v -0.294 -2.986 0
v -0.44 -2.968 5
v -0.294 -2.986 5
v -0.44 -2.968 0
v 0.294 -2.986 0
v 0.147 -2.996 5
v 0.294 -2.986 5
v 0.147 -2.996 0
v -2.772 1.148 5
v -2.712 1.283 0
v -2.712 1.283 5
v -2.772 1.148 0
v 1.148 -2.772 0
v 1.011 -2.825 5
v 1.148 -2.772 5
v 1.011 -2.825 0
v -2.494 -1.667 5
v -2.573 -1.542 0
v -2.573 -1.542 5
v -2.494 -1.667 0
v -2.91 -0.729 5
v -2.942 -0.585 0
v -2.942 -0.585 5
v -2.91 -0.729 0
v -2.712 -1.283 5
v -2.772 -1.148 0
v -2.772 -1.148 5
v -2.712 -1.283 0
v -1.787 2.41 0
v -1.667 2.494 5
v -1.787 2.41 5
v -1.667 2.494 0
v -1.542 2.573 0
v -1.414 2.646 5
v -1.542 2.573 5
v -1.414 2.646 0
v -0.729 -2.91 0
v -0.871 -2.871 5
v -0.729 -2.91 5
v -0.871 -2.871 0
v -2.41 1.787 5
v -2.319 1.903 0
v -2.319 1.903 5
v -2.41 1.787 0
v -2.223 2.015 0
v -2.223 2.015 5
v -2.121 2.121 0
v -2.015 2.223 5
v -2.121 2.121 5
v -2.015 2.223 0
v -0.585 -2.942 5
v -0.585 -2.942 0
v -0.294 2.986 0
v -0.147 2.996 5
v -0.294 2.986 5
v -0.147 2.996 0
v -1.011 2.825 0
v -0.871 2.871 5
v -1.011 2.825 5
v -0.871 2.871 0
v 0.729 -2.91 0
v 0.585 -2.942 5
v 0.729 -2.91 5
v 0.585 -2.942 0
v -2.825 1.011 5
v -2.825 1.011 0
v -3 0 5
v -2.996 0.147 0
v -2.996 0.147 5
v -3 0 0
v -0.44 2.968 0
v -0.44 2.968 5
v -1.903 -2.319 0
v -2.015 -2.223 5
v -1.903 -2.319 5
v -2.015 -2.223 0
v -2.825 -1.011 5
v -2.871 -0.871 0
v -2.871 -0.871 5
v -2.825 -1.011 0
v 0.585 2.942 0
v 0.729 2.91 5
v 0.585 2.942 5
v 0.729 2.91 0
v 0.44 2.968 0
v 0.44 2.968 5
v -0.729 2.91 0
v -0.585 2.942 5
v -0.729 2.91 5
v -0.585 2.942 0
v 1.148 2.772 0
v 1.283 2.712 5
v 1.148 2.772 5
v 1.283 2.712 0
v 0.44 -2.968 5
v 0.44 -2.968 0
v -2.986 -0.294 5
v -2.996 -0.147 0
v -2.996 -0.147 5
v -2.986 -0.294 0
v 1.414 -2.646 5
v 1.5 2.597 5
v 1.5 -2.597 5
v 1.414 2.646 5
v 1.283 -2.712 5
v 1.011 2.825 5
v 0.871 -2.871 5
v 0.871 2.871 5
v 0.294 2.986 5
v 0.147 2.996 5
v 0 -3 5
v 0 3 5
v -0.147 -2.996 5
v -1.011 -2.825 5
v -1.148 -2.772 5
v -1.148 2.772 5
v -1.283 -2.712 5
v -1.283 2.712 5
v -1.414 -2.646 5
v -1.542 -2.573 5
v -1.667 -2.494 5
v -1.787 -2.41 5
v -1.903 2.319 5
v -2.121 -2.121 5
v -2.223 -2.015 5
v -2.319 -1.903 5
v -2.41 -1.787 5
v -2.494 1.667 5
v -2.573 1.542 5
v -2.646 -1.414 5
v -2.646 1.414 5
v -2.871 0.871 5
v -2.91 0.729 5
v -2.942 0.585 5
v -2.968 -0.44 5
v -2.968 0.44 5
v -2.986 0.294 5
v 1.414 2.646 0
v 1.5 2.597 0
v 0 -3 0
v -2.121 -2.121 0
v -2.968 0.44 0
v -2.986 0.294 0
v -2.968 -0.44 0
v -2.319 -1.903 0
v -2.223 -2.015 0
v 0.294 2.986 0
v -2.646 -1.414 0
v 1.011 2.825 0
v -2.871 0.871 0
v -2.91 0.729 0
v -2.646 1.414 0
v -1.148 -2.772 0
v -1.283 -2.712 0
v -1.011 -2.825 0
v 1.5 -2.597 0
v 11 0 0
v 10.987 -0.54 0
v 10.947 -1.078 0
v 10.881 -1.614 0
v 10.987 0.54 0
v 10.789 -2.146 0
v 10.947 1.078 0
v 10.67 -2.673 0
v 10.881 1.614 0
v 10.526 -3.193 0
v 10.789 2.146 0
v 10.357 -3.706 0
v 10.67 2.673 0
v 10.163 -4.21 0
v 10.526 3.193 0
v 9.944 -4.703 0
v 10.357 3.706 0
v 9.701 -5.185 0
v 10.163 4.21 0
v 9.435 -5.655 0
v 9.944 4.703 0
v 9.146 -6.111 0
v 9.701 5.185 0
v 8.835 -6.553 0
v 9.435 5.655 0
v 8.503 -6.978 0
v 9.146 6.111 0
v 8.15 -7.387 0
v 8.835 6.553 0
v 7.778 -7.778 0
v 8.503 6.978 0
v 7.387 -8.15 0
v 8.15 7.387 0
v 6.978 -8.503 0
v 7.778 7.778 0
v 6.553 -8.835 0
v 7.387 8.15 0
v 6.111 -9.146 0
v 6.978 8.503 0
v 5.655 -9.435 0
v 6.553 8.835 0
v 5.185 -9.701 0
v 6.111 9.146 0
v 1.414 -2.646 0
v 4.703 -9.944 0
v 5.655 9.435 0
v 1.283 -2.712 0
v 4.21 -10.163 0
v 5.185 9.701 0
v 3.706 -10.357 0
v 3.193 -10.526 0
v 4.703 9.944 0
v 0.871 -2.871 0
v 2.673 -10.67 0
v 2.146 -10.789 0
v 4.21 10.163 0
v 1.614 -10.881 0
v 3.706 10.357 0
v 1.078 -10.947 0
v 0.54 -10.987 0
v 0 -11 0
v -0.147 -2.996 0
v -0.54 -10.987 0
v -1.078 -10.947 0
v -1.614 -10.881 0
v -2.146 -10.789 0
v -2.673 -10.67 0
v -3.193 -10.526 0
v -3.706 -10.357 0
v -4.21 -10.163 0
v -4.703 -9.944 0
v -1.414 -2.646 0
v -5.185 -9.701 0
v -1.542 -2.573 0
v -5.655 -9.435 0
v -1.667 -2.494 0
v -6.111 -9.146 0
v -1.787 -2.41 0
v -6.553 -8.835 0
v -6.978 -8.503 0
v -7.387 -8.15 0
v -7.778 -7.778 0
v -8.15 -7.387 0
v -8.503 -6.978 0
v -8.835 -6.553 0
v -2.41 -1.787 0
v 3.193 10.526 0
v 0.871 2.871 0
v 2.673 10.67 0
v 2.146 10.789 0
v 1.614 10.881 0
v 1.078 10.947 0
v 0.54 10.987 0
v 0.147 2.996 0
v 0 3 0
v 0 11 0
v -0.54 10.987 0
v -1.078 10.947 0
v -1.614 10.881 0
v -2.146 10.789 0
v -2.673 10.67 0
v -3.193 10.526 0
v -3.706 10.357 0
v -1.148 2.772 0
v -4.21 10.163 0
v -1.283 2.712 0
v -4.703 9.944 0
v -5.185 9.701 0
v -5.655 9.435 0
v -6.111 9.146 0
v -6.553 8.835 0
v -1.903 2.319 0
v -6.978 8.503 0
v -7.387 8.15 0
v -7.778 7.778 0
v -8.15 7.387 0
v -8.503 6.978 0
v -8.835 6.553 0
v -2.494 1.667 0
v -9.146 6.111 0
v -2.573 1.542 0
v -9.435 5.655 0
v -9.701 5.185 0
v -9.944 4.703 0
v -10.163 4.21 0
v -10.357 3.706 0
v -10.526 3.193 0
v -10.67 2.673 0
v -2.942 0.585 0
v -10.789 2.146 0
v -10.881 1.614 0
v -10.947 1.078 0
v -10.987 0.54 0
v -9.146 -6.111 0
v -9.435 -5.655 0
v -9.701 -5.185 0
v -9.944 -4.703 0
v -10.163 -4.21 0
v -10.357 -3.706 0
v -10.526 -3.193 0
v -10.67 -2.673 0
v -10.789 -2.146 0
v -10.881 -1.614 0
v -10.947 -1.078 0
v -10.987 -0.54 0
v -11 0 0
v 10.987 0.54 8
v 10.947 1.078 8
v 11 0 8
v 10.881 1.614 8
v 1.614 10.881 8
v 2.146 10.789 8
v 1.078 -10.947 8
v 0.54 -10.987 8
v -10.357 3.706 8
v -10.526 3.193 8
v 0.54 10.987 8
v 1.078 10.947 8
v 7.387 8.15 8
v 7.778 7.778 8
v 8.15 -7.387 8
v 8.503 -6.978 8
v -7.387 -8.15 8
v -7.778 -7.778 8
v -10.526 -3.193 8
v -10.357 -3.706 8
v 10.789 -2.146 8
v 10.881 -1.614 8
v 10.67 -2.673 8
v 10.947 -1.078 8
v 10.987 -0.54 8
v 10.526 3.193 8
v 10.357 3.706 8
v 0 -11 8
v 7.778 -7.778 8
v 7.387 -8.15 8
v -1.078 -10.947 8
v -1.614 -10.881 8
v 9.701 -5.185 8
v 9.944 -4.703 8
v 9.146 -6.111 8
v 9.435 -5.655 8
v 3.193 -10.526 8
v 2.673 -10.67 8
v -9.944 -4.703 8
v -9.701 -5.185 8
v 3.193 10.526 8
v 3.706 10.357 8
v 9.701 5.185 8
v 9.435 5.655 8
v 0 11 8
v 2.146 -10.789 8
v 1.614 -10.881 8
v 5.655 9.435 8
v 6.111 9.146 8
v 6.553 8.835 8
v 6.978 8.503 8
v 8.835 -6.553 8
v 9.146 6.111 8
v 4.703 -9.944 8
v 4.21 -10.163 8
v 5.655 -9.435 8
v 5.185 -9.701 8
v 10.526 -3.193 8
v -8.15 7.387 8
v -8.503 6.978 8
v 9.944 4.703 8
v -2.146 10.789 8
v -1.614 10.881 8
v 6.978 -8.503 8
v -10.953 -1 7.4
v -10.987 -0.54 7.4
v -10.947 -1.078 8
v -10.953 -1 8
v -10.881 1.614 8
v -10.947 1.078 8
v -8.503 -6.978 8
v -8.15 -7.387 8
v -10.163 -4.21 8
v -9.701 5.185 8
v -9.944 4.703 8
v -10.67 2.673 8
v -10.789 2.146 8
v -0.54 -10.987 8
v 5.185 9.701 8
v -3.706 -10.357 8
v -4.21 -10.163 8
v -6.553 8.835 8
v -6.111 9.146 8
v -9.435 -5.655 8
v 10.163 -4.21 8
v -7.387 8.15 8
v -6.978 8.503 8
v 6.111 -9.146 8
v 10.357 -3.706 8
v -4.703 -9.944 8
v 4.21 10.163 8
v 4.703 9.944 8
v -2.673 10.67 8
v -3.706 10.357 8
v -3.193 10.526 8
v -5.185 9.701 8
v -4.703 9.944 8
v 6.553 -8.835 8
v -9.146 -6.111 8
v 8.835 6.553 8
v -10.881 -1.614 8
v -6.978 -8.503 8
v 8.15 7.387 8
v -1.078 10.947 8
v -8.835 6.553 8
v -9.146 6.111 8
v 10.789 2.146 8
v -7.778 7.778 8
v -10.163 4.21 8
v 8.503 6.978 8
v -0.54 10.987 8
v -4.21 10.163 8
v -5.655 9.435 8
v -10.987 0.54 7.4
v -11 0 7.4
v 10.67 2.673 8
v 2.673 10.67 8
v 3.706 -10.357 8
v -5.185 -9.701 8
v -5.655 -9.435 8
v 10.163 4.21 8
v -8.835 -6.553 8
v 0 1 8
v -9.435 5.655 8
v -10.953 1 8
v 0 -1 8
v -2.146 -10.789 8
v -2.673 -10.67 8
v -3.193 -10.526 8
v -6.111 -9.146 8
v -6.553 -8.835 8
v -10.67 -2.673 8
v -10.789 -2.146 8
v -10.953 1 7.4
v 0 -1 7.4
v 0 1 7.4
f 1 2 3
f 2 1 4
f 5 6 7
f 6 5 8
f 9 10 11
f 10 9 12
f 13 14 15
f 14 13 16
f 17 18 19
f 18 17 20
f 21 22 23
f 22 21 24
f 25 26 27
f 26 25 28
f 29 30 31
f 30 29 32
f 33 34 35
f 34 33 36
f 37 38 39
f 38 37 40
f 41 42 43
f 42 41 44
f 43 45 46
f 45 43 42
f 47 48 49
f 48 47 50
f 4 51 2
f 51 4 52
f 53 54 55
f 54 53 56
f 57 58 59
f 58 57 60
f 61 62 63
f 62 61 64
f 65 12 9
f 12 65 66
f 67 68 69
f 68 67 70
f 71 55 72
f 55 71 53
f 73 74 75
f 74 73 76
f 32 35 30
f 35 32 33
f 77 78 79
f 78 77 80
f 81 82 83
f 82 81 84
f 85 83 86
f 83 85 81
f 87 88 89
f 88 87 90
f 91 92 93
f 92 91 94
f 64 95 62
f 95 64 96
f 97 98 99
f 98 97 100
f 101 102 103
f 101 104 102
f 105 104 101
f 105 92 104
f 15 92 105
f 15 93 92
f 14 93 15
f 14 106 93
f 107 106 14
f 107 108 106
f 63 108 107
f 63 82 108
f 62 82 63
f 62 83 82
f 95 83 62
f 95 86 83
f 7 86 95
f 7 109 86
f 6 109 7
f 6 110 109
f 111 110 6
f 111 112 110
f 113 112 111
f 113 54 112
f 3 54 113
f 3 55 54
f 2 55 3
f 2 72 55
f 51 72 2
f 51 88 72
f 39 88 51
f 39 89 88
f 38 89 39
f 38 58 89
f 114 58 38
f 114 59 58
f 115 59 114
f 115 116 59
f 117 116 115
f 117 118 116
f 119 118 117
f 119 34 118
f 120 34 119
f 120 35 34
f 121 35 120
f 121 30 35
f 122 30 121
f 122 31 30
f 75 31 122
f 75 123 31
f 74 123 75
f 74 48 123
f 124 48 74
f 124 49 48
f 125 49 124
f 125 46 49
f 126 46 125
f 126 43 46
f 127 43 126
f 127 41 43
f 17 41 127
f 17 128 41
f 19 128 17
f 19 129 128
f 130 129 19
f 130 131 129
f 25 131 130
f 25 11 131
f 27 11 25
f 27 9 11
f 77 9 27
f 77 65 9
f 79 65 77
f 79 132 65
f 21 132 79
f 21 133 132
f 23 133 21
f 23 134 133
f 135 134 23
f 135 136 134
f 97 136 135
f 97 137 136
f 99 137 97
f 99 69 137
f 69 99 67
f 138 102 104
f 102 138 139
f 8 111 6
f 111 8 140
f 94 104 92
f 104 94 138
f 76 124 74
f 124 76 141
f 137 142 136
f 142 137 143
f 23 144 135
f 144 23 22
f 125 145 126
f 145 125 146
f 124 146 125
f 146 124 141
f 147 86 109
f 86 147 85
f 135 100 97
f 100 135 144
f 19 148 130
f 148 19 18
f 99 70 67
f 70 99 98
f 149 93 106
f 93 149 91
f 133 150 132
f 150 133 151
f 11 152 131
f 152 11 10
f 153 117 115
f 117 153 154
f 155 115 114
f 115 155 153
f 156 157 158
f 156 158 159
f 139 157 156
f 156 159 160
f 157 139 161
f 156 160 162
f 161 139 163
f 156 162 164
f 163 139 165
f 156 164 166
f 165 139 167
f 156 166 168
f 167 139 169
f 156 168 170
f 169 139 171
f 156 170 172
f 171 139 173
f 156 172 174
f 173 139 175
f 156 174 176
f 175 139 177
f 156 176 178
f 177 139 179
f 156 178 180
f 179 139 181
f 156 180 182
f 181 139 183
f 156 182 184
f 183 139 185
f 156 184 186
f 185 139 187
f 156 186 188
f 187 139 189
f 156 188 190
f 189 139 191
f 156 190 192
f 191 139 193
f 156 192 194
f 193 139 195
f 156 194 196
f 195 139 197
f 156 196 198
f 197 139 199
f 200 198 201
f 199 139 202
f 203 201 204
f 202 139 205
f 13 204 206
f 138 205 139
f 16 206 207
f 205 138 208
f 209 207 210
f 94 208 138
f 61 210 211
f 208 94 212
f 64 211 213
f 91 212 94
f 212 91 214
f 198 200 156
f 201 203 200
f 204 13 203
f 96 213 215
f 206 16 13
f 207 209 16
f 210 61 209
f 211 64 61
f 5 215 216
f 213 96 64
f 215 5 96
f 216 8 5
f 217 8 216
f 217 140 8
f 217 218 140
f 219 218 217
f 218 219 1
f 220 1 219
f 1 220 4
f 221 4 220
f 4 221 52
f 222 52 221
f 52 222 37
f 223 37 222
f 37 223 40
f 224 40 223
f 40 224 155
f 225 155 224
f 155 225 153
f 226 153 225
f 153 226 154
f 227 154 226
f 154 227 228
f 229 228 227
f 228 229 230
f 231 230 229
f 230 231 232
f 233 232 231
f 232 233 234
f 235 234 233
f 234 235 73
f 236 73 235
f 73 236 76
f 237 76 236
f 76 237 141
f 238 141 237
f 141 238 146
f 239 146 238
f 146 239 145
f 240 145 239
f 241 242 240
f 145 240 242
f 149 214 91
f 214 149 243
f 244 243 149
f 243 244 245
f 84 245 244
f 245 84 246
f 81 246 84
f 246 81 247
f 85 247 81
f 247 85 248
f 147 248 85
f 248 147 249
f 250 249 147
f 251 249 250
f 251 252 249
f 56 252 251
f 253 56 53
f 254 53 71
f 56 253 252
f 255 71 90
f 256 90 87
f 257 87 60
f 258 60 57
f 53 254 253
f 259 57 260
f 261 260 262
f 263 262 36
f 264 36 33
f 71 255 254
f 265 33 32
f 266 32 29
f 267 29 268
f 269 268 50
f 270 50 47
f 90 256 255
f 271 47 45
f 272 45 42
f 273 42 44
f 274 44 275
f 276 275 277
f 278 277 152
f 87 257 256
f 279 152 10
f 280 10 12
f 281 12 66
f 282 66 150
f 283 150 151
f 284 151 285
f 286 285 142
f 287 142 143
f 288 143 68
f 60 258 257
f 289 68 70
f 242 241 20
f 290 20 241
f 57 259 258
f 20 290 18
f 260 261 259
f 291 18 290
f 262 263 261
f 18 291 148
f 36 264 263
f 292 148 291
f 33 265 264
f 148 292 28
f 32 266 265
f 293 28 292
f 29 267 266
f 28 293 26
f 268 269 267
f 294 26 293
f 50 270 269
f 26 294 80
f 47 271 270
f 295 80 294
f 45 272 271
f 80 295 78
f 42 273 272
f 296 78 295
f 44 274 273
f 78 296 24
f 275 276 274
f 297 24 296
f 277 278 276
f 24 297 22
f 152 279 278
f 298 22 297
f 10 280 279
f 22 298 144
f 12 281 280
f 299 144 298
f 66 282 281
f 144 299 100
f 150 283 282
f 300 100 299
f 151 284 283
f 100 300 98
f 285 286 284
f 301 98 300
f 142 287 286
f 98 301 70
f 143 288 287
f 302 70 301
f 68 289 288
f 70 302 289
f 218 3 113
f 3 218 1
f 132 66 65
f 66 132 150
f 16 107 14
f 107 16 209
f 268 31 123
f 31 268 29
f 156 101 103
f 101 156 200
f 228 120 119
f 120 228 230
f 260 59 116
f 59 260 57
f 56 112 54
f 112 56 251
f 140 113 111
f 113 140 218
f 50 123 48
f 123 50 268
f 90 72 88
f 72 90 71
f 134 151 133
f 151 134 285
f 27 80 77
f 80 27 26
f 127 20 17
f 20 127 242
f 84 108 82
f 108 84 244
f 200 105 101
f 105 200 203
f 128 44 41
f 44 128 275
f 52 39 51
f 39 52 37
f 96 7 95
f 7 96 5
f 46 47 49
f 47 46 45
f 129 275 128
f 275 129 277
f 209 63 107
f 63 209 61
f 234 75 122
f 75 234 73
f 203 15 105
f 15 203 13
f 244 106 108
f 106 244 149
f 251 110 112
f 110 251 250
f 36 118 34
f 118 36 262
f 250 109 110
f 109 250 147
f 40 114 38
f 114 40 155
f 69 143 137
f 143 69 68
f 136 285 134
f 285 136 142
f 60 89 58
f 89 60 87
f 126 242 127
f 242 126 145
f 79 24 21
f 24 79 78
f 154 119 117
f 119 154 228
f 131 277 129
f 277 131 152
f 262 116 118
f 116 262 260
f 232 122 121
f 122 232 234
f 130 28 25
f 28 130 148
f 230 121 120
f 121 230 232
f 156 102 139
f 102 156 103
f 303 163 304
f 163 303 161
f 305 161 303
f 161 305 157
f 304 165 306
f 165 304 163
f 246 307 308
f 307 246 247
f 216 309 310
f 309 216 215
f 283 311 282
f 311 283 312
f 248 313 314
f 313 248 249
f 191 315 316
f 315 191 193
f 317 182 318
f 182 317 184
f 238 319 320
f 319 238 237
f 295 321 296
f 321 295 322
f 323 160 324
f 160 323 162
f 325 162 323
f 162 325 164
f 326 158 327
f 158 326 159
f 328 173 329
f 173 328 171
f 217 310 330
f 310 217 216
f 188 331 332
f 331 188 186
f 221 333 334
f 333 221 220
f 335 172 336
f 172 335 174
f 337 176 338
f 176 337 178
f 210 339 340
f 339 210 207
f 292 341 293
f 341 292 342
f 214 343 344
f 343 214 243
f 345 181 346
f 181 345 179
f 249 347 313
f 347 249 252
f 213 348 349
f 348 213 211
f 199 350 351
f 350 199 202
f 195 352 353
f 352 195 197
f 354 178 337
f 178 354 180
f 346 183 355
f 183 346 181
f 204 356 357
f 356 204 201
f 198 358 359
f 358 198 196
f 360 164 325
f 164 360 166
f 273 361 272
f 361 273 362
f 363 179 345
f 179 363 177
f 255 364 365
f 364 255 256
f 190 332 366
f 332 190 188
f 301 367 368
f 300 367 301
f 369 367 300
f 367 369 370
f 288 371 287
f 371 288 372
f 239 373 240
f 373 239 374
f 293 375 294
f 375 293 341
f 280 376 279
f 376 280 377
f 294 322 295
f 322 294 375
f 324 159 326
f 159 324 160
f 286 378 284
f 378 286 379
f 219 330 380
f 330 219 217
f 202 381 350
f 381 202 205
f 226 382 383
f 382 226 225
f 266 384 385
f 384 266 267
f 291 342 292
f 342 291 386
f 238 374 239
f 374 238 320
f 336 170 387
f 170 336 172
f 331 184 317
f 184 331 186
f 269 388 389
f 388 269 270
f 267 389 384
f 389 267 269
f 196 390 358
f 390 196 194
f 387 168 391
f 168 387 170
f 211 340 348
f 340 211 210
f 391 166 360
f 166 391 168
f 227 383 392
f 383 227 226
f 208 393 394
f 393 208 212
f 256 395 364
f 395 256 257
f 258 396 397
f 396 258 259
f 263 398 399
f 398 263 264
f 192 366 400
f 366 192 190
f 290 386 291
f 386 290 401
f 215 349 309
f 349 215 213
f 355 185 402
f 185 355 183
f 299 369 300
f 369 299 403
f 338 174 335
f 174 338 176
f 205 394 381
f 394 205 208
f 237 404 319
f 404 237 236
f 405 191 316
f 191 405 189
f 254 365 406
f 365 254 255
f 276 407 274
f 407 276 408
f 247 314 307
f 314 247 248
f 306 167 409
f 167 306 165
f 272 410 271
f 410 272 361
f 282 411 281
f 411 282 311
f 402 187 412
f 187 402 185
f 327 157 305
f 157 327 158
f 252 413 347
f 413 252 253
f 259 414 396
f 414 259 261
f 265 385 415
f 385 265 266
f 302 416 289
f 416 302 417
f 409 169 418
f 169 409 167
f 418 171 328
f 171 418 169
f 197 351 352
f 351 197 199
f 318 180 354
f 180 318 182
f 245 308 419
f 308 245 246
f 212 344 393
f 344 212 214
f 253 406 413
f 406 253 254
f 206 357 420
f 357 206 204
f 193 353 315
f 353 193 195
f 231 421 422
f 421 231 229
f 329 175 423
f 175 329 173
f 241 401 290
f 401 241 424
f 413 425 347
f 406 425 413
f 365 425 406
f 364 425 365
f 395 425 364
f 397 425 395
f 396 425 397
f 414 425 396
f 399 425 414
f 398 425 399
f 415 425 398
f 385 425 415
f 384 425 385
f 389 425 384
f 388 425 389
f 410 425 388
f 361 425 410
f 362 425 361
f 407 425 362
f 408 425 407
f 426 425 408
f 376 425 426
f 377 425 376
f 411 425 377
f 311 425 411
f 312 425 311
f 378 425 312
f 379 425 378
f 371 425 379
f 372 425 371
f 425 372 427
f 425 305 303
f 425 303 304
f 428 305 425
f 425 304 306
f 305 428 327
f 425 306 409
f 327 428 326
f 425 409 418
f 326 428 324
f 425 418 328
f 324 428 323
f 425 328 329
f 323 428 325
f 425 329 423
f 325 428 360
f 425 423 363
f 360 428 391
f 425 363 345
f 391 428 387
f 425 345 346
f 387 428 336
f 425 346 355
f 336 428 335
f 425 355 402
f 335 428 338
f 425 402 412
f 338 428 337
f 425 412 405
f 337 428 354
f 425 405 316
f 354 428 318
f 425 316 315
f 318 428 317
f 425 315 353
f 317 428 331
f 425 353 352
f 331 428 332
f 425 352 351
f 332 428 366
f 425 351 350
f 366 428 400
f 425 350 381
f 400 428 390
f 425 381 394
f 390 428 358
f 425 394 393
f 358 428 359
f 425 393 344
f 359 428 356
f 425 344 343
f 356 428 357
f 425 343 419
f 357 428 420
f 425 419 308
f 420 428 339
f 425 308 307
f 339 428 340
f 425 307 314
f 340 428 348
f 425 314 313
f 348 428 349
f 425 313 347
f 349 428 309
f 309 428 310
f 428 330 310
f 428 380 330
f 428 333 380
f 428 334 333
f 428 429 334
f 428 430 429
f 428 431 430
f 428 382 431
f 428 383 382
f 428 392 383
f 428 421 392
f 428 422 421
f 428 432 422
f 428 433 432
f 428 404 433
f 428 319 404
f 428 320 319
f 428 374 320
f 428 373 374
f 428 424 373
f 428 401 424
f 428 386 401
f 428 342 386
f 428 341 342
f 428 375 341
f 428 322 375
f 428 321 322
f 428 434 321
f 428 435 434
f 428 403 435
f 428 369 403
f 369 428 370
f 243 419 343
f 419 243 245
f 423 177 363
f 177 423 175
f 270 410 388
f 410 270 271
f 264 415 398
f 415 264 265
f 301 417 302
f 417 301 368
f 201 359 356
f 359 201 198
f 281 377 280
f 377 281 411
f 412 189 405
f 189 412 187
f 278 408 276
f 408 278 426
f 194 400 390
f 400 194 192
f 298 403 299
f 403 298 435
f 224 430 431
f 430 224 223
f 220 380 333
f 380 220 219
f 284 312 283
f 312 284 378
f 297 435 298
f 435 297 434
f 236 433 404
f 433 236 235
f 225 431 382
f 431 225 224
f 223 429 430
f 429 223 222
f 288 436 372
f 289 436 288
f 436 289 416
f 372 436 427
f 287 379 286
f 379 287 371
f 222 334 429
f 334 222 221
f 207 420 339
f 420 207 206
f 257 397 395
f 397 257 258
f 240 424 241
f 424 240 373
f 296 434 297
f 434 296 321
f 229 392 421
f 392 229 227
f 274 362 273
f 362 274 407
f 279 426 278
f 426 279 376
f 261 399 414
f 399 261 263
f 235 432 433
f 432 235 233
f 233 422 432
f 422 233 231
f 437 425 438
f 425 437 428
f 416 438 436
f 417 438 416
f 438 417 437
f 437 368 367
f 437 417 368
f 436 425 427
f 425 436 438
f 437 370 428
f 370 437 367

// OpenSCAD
shaft_diameter = 6;
shaft_radius = shaft_diameter * 0.5;
shaft_flat_diameter = 4.5;
shaft_flat_radius = shaft_flat_diameter - shaft_radius;
shaft_cut_depth = 5;

knob_diameter = 22;
knob_radius = knob_diameter * 0.5;
knob_height = 8;

knob_dial_cut_width = 2;
knob_dial_cut_depth = 0.6;

$fn = 128;



module shaft_volume() {
	difference() {
		cylinder(h = shaft_cut_depth, d = shaft_diameter);
		translate([shaft_flat_radius, -shaft_radius, 0]) {
			cube([shaft_diameter, shaft_diameter, shaft_cut_depth]);
		}
	}
}



module knob() {
	difference() {
		cylinder(h = knob_height, d = knob_diameter);
		shaft_volume();
		translate([-knob_radius, -knob_dial_cut_width*0.5, knob_height - knob_dial_cut_depth]) {
			cube([knob_radius, knob_dial_cut_width, 100]);
		}
	}
}



knob();
